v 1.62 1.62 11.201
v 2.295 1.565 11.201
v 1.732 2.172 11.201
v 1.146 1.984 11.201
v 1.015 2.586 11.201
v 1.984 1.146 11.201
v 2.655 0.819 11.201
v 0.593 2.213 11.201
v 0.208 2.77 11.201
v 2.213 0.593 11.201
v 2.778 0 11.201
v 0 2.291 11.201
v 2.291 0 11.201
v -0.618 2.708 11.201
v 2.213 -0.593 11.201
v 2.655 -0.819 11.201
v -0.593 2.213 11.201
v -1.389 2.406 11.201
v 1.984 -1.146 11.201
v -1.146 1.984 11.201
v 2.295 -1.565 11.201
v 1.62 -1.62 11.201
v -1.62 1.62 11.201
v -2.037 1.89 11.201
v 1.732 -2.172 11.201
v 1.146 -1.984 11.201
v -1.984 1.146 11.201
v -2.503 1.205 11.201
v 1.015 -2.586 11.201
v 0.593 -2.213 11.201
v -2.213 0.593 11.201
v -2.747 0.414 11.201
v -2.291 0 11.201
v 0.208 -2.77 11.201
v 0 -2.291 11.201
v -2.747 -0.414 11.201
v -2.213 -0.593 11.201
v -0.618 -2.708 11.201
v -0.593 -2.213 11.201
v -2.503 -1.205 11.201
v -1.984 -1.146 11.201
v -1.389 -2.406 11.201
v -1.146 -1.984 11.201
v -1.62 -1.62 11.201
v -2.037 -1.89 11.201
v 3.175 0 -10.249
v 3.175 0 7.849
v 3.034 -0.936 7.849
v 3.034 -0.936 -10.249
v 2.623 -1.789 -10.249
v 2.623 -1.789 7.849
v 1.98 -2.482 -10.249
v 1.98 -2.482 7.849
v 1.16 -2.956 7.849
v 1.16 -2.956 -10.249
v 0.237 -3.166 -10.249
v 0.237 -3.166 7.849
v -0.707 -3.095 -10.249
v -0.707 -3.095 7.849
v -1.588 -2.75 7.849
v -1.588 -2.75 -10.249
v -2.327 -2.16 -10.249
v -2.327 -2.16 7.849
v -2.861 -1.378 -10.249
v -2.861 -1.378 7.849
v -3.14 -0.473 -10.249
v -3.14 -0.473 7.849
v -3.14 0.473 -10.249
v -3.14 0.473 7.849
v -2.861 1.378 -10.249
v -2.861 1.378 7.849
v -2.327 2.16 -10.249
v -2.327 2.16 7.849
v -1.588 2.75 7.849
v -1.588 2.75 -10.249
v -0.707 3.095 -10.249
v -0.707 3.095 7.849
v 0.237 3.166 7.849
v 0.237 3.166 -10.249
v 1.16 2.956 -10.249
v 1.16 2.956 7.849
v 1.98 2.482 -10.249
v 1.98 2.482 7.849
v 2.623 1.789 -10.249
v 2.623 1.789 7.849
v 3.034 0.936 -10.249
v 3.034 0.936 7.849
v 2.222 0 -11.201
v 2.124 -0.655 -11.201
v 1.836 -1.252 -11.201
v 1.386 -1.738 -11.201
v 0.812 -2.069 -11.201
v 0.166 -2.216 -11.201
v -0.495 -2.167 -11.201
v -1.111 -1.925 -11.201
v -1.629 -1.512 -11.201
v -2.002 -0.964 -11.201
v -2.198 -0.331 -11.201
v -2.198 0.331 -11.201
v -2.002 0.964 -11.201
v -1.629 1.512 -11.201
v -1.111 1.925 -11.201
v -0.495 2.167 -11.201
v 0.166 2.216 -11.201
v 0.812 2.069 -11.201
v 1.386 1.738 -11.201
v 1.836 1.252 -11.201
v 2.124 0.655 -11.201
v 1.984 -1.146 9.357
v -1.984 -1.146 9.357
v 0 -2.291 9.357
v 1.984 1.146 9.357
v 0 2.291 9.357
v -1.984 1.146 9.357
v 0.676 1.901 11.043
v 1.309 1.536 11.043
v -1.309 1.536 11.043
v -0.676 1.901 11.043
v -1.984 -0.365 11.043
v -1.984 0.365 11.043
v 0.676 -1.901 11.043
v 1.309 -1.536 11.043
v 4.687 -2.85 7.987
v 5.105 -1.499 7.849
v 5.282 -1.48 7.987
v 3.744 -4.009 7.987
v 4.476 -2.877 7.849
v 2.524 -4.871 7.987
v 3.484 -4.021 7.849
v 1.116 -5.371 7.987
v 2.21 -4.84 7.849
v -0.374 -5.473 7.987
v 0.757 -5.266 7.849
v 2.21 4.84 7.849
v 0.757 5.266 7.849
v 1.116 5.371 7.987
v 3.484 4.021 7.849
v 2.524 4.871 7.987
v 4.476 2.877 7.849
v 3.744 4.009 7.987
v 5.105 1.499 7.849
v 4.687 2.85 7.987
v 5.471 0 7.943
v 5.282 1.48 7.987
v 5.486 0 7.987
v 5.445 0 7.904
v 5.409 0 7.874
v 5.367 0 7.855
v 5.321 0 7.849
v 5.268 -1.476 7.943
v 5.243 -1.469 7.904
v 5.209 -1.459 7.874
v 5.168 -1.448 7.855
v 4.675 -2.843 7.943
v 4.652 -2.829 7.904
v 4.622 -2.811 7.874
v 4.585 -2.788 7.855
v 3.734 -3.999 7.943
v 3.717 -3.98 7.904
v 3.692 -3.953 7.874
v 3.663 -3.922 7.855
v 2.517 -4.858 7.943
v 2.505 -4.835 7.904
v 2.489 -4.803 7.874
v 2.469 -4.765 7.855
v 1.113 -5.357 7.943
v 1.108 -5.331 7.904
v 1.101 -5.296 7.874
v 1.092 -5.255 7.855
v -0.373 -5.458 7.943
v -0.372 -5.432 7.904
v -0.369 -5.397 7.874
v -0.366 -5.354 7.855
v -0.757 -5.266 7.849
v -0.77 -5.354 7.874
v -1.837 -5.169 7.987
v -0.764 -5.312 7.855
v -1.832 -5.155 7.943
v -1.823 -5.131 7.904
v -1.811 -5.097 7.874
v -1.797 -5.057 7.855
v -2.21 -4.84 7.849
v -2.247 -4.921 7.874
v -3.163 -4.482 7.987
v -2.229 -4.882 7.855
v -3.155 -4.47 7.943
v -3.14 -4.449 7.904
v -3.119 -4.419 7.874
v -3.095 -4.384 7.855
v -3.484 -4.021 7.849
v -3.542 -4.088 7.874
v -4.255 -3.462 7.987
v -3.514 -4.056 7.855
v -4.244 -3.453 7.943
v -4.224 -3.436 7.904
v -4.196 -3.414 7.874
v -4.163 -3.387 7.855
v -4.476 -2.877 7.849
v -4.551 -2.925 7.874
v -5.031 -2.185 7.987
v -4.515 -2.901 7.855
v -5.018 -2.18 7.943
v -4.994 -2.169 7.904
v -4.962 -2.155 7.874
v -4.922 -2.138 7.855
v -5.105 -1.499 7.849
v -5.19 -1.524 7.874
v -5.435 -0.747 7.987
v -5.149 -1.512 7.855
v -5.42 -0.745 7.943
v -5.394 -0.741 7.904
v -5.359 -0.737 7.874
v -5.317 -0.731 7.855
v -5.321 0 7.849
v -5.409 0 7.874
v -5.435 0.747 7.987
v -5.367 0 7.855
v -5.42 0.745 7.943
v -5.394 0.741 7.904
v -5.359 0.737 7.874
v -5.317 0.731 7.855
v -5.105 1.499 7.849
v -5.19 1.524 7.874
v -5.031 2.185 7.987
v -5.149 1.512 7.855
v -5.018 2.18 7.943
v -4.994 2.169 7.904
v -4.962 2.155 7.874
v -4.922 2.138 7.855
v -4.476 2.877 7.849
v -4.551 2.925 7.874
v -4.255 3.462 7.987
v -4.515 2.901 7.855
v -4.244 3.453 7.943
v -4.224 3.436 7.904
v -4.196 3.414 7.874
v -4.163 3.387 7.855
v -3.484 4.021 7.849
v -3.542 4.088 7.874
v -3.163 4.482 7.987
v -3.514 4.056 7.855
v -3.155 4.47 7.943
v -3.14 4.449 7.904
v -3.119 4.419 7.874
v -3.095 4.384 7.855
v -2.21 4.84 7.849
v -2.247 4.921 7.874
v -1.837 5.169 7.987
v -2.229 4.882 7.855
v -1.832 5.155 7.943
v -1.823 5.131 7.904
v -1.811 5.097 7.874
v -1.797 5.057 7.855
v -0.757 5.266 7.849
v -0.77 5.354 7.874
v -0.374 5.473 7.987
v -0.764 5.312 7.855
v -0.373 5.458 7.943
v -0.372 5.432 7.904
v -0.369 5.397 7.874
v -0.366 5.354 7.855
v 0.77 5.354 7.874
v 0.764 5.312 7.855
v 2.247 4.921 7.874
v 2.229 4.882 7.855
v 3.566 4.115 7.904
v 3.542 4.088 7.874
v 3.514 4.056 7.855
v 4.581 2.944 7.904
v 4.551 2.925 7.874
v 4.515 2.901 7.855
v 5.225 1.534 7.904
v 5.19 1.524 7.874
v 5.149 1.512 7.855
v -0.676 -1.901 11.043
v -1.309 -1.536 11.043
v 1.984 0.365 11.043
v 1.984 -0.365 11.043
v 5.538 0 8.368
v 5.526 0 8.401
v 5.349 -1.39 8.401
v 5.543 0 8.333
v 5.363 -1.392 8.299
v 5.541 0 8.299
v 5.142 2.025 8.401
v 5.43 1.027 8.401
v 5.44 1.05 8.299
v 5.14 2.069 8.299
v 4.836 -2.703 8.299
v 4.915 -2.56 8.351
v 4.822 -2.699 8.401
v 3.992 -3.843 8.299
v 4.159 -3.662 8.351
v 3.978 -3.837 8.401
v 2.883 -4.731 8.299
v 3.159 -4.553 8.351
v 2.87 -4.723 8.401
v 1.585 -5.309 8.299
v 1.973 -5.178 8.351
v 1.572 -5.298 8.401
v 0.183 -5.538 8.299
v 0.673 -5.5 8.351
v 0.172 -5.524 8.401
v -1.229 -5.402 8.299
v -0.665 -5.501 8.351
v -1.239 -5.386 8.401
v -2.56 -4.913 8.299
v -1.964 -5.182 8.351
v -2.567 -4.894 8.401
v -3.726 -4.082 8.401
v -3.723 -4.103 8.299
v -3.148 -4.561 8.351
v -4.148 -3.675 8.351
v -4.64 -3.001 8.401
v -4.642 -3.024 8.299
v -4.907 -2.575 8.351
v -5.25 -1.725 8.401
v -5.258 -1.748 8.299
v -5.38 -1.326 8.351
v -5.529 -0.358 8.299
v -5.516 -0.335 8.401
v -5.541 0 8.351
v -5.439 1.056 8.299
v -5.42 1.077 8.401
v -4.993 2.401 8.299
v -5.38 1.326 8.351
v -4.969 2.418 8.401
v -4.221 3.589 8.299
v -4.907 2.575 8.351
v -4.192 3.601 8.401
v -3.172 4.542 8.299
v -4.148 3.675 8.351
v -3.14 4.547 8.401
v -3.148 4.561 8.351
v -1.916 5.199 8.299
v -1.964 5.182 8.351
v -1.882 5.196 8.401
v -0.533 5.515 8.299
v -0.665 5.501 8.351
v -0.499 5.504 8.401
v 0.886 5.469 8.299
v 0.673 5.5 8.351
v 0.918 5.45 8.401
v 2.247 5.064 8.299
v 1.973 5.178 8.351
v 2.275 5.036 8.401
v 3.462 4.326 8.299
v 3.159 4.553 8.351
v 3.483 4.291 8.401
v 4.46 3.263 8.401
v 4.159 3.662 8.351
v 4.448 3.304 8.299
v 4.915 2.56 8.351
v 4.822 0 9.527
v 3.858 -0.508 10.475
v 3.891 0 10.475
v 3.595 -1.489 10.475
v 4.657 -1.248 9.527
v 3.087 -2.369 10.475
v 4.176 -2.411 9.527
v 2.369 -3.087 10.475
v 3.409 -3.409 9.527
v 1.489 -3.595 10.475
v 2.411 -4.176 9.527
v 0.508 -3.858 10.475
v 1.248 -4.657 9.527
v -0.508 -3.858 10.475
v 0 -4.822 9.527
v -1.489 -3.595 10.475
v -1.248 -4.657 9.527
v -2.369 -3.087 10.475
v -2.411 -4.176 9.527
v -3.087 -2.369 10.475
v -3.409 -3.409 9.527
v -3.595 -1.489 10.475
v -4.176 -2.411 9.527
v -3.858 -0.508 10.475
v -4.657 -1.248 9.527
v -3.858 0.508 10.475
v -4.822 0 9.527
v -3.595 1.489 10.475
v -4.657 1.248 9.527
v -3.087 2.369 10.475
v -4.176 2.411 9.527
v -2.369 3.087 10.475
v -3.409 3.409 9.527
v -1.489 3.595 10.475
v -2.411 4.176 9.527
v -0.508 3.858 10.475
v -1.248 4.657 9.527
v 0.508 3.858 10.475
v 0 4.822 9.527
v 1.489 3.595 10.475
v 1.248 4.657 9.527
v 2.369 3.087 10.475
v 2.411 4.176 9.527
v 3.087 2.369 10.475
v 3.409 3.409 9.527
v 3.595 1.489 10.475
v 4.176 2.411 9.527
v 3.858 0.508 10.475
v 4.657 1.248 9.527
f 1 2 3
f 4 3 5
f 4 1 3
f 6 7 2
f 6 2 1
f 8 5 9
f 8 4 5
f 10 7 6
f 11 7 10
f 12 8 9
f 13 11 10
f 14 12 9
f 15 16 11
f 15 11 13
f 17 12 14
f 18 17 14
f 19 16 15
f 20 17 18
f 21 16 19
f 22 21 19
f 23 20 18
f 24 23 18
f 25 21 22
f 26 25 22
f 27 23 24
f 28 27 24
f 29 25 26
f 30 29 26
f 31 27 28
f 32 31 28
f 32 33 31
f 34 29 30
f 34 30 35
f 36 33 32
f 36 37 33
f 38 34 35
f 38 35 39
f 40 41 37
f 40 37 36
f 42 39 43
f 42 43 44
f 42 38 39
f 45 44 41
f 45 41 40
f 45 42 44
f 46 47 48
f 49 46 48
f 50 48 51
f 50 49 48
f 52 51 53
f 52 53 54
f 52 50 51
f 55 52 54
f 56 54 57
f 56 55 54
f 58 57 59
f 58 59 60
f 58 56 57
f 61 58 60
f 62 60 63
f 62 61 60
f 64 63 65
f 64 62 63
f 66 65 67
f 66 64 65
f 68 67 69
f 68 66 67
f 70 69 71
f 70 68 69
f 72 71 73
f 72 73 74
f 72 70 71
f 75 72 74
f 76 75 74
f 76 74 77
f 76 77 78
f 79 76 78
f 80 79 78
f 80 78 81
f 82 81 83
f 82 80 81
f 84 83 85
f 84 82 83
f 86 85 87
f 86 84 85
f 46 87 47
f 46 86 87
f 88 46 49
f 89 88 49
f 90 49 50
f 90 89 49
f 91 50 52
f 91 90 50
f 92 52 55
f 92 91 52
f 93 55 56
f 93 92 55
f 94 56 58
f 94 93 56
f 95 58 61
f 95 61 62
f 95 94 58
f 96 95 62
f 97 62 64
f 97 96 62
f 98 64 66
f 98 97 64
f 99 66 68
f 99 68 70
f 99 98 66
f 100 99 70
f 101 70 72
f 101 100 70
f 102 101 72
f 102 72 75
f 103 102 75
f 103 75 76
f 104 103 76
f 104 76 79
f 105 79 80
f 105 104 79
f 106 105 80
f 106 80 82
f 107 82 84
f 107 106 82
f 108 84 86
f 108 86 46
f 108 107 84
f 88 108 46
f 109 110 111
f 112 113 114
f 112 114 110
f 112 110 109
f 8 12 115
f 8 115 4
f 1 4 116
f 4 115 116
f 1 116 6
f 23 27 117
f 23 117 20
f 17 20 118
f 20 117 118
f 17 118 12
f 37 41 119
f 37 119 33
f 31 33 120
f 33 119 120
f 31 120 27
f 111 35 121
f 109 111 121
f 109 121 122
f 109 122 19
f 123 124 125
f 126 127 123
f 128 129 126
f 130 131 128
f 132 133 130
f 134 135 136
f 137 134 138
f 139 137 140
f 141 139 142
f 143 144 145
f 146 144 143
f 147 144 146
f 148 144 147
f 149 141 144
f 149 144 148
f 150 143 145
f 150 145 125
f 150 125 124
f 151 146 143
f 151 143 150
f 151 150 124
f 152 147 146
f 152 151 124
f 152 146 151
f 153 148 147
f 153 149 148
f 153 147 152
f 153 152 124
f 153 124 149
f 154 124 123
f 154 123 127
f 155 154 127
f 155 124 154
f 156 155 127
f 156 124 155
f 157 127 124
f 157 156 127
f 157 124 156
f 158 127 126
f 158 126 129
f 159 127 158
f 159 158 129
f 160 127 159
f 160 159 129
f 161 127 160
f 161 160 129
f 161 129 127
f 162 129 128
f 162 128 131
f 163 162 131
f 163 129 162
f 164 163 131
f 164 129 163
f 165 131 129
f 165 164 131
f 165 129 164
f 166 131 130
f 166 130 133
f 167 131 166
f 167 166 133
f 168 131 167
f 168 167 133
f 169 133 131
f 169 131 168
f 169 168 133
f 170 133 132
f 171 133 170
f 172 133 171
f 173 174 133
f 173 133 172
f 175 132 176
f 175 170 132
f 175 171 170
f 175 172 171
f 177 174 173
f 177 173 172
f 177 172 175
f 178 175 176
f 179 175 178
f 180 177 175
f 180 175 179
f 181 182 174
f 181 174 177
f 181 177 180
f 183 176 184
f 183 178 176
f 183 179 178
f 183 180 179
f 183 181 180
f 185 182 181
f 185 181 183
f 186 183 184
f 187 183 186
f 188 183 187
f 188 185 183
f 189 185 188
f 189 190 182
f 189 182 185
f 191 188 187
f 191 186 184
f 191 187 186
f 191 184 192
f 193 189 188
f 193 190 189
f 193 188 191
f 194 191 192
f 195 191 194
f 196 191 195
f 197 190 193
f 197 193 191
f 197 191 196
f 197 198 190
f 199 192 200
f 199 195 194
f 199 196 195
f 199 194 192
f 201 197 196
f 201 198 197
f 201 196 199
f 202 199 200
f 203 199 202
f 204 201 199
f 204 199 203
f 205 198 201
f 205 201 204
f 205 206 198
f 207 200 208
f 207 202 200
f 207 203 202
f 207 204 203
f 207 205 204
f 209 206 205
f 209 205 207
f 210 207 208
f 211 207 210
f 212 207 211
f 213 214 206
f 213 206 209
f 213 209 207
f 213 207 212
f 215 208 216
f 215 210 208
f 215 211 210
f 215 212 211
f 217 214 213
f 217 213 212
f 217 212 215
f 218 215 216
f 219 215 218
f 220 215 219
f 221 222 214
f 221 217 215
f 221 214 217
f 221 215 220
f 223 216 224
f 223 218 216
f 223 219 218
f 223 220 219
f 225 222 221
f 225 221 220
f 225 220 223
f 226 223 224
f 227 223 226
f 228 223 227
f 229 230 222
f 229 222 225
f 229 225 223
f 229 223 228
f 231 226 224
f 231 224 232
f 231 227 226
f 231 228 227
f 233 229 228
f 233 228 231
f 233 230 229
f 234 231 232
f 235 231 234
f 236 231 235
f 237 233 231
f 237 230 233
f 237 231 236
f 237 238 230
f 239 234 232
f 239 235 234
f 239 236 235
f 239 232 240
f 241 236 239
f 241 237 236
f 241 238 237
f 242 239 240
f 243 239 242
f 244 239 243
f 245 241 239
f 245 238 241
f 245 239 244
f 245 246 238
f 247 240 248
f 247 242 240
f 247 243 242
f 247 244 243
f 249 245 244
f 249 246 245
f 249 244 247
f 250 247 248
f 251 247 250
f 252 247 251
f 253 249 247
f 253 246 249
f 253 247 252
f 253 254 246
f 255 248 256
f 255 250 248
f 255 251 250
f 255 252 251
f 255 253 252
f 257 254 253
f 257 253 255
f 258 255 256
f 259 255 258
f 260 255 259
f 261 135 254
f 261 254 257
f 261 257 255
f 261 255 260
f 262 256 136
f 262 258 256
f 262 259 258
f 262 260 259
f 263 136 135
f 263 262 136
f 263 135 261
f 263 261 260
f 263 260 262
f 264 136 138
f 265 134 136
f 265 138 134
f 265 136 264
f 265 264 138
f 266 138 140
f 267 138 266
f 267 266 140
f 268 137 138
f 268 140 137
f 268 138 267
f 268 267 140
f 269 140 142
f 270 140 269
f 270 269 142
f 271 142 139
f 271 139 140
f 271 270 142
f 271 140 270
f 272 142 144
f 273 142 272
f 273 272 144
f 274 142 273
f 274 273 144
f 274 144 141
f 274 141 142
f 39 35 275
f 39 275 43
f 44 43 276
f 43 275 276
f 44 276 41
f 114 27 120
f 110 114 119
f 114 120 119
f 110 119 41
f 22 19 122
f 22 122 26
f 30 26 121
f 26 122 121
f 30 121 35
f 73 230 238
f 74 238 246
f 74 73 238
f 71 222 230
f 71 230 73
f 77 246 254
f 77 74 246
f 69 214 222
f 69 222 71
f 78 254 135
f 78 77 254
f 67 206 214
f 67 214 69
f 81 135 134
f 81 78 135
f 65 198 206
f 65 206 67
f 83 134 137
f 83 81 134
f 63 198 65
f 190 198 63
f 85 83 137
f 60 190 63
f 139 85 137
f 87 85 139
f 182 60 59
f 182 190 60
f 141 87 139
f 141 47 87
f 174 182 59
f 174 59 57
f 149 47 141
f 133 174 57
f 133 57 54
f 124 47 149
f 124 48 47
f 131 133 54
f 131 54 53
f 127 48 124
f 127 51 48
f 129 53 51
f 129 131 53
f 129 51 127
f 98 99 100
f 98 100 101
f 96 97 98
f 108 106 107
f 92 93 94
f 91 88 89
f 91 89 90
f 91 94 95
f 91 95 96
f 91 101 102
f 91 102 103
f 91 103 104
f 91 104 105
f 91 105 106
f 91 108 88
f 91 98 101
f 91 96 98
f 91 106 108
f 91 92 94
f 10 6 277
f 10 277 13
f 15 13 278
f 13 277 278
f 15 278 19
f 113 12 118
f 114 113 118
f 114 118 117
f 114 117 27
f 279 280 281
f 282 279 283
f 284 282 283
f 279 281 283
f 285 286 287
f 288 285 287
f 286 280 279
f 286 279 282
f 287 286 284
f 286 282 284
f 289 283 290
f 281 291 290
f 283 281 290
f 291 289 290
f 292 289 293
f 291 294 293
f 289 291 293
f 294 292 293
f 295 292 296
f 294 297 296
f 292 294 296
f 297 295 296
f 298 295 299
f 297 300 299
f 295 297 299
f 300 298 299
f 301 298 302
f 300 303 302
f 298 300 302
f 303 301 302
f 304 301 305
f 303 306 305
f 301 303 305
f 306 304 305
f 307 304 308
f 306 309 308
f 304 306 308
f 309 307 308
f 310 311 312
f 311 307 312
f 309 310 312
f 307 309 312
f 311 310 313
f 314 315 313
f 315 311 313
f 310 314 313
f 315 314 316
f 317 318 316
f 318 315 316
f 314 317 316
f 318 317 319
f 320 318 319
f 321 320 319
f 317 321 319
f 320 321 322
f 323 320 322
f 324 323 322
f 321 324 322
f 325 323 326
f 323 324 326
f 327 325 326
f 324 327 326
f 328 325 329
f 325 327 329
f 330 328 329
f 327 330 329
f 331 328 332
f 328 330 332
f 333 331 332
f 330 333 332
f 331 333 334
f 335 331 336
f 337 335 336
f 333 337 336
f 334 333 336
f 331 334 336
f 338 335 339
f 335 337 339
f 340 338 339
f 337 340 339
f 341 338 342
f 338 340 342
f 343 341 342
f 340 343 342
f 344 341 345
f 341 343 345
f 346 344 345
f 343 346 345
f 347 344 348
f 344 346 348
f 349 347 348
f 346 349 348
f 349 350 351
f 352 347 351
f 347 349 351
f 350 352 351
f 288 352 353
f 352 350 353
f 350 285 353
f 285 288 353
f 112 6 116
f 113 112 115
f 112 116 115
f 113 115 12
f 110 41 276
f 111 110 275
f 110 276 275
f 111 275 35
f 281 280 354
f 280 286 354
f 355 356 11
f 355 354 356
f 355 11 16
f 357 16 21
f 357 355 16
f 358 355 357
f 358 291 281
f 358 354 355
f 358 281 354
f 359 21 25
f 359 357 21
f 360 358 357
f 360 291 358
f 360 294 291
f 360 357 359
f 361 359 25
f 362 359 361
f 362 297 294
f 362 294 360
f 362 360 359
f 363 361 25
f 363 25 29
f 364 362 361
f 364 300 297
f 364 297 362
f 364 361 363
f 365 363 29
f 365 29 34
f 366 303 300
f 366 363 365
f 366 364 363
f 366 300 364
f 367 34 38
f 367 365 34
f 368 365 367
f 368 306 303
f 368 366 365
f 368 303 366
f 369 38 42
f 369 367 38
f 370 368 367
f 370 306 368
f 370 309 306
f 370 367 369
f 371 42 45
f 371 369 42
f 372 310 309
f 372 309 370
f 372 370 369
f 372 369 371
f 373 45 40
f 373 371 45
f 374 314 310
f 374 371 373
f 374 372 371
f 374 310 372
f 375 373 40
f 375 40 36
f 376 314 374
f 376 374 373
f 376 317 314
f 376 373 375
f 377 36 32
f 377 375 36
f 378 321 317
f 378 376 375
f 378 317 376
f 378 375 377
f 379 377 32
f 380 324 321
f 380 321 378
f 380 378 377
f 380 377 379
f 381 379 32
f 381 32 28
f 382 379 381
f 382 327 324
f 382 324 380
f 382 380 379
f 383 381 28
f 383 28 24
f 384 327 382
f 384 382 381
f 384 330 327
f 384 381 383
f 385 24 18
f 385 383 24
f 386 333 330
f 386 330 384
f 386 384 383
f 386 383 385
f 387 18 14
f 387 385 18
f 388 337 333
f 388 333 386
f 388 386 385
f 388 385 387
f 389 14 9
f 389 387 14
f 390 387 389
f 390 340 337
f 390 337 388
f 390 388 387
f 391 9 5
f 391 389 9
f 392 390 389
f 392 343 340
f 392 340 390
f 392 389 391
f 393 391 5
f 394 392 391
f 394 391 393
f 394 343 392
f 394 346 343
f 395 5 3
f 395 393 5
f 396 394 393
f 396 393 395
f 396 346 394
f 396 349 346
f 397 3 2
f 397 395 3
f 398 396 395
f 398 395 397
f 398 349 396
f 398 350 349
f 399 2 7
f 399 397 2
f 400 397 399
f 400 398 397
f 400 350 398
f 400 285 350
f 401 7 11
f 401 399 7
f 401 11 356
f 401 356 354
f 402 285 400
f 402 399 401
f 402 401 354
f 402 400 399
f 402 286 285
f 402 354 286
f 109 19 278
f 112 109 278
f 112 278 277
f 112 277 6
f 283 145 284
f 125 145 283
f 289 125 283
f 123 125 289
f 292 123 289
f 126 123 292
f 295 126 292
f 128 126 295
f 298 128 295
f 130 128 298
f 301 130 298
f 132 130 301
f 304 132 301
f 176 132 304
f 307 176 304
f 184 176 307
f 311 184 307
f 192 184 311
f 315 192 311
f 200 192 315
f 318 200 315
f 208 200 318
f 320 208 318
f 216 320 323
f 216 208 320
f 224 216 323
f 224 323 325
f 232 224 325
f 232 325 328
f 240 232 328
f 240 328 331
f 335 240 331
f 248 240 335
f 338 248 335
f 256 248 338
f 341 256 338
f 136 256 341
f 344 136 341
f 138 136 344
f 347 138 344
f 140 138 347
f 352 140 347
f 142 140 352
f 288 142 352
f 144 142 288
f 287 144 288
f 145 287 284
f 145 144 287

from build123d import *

# Parameters (mm, degrees)
CUT_EXTRUDE1_DEPTH = 1.84404
FILLET1_R          = 0.16764


with BuildPart() as part:
    # Sketch3 → Revolve1 (revolve)
    with BuildSketch(Plane(origin=(0, 0, 0), x_dir=(0, 0, -1), z_dir=(1, 0, 0)), mode=Mode.PRIVATE) as revolve1_sk:
        with BuildLine():
            Line((-11.2014, 0), (-11.2014, 2.778125))
            ThreePointArc((-11.2014, 2.778125), (-10.007024687, 4.401074199), (-8.35152, 5.5499))
            Line((-8.35152, 5.5499), (-7.8486, 5.461221635))
            Line((-7.8486, 5.461221635), (-7.8486, 3.175))
            Line((-7.8486, 3.175), (10.2489, 3.175))
            Line((10.2489, 3.175), (11.2014, 2.2225))
            Line((11.2014, 2.2225), (11.2014, 0))
            Line((11.2014, 0), (-11.2014, 0))
        make_face()
    revolve(revolve1_sk.sketch.rotate(Axis((0, 0, 11.2014), (0, 0, -1)), 90), axis=Axis((0, 0, 11.2014), (0, 0, -1)))

    # Sketch4 → Cut-Extrude1 (cut)
    with BuildSketch(Plane.XY.offset(11.2014)):
        Polygon((-1.984375, -1.14567944), (0, -2.291358881), (1.984375, -1.14567944), (1.984375, 1.14567944), (0, 2.291358881), (-1.984375, 1.14567944), align=None)
    extrude(amount=-CUT_EXTRUDE1_DEPTH, mode=Mode.SUBTRACT)

    # Cut-Extrude2 cone 1 section (through the dimple's axis) → Cut-Extrude2 (revolve, cut)
    with BuildSketch(Plane(origin=(0, 0, 11.2014), x_dir=(0, -1, 0), z_dir=(1, 0, 0))):
        Polygon((0, 0), (2.291358881, 0), (0, 1.322916667), align=None)
    revolve(axis=Axis((0, 0, 11.2014), (0, 0, -1)), mode=Mode.SUBTRACT)

    # Fillet1
    fillet1_edges = [part.edges().sort_by_distance(p)[0] for p in [
        (-5.461221635, 0, 7.8486),
        (-5.5499, 0, 8.35152),
    ]]
    fillet(fillet1_edges, radius=FILLET1_R)


solid = part.part
